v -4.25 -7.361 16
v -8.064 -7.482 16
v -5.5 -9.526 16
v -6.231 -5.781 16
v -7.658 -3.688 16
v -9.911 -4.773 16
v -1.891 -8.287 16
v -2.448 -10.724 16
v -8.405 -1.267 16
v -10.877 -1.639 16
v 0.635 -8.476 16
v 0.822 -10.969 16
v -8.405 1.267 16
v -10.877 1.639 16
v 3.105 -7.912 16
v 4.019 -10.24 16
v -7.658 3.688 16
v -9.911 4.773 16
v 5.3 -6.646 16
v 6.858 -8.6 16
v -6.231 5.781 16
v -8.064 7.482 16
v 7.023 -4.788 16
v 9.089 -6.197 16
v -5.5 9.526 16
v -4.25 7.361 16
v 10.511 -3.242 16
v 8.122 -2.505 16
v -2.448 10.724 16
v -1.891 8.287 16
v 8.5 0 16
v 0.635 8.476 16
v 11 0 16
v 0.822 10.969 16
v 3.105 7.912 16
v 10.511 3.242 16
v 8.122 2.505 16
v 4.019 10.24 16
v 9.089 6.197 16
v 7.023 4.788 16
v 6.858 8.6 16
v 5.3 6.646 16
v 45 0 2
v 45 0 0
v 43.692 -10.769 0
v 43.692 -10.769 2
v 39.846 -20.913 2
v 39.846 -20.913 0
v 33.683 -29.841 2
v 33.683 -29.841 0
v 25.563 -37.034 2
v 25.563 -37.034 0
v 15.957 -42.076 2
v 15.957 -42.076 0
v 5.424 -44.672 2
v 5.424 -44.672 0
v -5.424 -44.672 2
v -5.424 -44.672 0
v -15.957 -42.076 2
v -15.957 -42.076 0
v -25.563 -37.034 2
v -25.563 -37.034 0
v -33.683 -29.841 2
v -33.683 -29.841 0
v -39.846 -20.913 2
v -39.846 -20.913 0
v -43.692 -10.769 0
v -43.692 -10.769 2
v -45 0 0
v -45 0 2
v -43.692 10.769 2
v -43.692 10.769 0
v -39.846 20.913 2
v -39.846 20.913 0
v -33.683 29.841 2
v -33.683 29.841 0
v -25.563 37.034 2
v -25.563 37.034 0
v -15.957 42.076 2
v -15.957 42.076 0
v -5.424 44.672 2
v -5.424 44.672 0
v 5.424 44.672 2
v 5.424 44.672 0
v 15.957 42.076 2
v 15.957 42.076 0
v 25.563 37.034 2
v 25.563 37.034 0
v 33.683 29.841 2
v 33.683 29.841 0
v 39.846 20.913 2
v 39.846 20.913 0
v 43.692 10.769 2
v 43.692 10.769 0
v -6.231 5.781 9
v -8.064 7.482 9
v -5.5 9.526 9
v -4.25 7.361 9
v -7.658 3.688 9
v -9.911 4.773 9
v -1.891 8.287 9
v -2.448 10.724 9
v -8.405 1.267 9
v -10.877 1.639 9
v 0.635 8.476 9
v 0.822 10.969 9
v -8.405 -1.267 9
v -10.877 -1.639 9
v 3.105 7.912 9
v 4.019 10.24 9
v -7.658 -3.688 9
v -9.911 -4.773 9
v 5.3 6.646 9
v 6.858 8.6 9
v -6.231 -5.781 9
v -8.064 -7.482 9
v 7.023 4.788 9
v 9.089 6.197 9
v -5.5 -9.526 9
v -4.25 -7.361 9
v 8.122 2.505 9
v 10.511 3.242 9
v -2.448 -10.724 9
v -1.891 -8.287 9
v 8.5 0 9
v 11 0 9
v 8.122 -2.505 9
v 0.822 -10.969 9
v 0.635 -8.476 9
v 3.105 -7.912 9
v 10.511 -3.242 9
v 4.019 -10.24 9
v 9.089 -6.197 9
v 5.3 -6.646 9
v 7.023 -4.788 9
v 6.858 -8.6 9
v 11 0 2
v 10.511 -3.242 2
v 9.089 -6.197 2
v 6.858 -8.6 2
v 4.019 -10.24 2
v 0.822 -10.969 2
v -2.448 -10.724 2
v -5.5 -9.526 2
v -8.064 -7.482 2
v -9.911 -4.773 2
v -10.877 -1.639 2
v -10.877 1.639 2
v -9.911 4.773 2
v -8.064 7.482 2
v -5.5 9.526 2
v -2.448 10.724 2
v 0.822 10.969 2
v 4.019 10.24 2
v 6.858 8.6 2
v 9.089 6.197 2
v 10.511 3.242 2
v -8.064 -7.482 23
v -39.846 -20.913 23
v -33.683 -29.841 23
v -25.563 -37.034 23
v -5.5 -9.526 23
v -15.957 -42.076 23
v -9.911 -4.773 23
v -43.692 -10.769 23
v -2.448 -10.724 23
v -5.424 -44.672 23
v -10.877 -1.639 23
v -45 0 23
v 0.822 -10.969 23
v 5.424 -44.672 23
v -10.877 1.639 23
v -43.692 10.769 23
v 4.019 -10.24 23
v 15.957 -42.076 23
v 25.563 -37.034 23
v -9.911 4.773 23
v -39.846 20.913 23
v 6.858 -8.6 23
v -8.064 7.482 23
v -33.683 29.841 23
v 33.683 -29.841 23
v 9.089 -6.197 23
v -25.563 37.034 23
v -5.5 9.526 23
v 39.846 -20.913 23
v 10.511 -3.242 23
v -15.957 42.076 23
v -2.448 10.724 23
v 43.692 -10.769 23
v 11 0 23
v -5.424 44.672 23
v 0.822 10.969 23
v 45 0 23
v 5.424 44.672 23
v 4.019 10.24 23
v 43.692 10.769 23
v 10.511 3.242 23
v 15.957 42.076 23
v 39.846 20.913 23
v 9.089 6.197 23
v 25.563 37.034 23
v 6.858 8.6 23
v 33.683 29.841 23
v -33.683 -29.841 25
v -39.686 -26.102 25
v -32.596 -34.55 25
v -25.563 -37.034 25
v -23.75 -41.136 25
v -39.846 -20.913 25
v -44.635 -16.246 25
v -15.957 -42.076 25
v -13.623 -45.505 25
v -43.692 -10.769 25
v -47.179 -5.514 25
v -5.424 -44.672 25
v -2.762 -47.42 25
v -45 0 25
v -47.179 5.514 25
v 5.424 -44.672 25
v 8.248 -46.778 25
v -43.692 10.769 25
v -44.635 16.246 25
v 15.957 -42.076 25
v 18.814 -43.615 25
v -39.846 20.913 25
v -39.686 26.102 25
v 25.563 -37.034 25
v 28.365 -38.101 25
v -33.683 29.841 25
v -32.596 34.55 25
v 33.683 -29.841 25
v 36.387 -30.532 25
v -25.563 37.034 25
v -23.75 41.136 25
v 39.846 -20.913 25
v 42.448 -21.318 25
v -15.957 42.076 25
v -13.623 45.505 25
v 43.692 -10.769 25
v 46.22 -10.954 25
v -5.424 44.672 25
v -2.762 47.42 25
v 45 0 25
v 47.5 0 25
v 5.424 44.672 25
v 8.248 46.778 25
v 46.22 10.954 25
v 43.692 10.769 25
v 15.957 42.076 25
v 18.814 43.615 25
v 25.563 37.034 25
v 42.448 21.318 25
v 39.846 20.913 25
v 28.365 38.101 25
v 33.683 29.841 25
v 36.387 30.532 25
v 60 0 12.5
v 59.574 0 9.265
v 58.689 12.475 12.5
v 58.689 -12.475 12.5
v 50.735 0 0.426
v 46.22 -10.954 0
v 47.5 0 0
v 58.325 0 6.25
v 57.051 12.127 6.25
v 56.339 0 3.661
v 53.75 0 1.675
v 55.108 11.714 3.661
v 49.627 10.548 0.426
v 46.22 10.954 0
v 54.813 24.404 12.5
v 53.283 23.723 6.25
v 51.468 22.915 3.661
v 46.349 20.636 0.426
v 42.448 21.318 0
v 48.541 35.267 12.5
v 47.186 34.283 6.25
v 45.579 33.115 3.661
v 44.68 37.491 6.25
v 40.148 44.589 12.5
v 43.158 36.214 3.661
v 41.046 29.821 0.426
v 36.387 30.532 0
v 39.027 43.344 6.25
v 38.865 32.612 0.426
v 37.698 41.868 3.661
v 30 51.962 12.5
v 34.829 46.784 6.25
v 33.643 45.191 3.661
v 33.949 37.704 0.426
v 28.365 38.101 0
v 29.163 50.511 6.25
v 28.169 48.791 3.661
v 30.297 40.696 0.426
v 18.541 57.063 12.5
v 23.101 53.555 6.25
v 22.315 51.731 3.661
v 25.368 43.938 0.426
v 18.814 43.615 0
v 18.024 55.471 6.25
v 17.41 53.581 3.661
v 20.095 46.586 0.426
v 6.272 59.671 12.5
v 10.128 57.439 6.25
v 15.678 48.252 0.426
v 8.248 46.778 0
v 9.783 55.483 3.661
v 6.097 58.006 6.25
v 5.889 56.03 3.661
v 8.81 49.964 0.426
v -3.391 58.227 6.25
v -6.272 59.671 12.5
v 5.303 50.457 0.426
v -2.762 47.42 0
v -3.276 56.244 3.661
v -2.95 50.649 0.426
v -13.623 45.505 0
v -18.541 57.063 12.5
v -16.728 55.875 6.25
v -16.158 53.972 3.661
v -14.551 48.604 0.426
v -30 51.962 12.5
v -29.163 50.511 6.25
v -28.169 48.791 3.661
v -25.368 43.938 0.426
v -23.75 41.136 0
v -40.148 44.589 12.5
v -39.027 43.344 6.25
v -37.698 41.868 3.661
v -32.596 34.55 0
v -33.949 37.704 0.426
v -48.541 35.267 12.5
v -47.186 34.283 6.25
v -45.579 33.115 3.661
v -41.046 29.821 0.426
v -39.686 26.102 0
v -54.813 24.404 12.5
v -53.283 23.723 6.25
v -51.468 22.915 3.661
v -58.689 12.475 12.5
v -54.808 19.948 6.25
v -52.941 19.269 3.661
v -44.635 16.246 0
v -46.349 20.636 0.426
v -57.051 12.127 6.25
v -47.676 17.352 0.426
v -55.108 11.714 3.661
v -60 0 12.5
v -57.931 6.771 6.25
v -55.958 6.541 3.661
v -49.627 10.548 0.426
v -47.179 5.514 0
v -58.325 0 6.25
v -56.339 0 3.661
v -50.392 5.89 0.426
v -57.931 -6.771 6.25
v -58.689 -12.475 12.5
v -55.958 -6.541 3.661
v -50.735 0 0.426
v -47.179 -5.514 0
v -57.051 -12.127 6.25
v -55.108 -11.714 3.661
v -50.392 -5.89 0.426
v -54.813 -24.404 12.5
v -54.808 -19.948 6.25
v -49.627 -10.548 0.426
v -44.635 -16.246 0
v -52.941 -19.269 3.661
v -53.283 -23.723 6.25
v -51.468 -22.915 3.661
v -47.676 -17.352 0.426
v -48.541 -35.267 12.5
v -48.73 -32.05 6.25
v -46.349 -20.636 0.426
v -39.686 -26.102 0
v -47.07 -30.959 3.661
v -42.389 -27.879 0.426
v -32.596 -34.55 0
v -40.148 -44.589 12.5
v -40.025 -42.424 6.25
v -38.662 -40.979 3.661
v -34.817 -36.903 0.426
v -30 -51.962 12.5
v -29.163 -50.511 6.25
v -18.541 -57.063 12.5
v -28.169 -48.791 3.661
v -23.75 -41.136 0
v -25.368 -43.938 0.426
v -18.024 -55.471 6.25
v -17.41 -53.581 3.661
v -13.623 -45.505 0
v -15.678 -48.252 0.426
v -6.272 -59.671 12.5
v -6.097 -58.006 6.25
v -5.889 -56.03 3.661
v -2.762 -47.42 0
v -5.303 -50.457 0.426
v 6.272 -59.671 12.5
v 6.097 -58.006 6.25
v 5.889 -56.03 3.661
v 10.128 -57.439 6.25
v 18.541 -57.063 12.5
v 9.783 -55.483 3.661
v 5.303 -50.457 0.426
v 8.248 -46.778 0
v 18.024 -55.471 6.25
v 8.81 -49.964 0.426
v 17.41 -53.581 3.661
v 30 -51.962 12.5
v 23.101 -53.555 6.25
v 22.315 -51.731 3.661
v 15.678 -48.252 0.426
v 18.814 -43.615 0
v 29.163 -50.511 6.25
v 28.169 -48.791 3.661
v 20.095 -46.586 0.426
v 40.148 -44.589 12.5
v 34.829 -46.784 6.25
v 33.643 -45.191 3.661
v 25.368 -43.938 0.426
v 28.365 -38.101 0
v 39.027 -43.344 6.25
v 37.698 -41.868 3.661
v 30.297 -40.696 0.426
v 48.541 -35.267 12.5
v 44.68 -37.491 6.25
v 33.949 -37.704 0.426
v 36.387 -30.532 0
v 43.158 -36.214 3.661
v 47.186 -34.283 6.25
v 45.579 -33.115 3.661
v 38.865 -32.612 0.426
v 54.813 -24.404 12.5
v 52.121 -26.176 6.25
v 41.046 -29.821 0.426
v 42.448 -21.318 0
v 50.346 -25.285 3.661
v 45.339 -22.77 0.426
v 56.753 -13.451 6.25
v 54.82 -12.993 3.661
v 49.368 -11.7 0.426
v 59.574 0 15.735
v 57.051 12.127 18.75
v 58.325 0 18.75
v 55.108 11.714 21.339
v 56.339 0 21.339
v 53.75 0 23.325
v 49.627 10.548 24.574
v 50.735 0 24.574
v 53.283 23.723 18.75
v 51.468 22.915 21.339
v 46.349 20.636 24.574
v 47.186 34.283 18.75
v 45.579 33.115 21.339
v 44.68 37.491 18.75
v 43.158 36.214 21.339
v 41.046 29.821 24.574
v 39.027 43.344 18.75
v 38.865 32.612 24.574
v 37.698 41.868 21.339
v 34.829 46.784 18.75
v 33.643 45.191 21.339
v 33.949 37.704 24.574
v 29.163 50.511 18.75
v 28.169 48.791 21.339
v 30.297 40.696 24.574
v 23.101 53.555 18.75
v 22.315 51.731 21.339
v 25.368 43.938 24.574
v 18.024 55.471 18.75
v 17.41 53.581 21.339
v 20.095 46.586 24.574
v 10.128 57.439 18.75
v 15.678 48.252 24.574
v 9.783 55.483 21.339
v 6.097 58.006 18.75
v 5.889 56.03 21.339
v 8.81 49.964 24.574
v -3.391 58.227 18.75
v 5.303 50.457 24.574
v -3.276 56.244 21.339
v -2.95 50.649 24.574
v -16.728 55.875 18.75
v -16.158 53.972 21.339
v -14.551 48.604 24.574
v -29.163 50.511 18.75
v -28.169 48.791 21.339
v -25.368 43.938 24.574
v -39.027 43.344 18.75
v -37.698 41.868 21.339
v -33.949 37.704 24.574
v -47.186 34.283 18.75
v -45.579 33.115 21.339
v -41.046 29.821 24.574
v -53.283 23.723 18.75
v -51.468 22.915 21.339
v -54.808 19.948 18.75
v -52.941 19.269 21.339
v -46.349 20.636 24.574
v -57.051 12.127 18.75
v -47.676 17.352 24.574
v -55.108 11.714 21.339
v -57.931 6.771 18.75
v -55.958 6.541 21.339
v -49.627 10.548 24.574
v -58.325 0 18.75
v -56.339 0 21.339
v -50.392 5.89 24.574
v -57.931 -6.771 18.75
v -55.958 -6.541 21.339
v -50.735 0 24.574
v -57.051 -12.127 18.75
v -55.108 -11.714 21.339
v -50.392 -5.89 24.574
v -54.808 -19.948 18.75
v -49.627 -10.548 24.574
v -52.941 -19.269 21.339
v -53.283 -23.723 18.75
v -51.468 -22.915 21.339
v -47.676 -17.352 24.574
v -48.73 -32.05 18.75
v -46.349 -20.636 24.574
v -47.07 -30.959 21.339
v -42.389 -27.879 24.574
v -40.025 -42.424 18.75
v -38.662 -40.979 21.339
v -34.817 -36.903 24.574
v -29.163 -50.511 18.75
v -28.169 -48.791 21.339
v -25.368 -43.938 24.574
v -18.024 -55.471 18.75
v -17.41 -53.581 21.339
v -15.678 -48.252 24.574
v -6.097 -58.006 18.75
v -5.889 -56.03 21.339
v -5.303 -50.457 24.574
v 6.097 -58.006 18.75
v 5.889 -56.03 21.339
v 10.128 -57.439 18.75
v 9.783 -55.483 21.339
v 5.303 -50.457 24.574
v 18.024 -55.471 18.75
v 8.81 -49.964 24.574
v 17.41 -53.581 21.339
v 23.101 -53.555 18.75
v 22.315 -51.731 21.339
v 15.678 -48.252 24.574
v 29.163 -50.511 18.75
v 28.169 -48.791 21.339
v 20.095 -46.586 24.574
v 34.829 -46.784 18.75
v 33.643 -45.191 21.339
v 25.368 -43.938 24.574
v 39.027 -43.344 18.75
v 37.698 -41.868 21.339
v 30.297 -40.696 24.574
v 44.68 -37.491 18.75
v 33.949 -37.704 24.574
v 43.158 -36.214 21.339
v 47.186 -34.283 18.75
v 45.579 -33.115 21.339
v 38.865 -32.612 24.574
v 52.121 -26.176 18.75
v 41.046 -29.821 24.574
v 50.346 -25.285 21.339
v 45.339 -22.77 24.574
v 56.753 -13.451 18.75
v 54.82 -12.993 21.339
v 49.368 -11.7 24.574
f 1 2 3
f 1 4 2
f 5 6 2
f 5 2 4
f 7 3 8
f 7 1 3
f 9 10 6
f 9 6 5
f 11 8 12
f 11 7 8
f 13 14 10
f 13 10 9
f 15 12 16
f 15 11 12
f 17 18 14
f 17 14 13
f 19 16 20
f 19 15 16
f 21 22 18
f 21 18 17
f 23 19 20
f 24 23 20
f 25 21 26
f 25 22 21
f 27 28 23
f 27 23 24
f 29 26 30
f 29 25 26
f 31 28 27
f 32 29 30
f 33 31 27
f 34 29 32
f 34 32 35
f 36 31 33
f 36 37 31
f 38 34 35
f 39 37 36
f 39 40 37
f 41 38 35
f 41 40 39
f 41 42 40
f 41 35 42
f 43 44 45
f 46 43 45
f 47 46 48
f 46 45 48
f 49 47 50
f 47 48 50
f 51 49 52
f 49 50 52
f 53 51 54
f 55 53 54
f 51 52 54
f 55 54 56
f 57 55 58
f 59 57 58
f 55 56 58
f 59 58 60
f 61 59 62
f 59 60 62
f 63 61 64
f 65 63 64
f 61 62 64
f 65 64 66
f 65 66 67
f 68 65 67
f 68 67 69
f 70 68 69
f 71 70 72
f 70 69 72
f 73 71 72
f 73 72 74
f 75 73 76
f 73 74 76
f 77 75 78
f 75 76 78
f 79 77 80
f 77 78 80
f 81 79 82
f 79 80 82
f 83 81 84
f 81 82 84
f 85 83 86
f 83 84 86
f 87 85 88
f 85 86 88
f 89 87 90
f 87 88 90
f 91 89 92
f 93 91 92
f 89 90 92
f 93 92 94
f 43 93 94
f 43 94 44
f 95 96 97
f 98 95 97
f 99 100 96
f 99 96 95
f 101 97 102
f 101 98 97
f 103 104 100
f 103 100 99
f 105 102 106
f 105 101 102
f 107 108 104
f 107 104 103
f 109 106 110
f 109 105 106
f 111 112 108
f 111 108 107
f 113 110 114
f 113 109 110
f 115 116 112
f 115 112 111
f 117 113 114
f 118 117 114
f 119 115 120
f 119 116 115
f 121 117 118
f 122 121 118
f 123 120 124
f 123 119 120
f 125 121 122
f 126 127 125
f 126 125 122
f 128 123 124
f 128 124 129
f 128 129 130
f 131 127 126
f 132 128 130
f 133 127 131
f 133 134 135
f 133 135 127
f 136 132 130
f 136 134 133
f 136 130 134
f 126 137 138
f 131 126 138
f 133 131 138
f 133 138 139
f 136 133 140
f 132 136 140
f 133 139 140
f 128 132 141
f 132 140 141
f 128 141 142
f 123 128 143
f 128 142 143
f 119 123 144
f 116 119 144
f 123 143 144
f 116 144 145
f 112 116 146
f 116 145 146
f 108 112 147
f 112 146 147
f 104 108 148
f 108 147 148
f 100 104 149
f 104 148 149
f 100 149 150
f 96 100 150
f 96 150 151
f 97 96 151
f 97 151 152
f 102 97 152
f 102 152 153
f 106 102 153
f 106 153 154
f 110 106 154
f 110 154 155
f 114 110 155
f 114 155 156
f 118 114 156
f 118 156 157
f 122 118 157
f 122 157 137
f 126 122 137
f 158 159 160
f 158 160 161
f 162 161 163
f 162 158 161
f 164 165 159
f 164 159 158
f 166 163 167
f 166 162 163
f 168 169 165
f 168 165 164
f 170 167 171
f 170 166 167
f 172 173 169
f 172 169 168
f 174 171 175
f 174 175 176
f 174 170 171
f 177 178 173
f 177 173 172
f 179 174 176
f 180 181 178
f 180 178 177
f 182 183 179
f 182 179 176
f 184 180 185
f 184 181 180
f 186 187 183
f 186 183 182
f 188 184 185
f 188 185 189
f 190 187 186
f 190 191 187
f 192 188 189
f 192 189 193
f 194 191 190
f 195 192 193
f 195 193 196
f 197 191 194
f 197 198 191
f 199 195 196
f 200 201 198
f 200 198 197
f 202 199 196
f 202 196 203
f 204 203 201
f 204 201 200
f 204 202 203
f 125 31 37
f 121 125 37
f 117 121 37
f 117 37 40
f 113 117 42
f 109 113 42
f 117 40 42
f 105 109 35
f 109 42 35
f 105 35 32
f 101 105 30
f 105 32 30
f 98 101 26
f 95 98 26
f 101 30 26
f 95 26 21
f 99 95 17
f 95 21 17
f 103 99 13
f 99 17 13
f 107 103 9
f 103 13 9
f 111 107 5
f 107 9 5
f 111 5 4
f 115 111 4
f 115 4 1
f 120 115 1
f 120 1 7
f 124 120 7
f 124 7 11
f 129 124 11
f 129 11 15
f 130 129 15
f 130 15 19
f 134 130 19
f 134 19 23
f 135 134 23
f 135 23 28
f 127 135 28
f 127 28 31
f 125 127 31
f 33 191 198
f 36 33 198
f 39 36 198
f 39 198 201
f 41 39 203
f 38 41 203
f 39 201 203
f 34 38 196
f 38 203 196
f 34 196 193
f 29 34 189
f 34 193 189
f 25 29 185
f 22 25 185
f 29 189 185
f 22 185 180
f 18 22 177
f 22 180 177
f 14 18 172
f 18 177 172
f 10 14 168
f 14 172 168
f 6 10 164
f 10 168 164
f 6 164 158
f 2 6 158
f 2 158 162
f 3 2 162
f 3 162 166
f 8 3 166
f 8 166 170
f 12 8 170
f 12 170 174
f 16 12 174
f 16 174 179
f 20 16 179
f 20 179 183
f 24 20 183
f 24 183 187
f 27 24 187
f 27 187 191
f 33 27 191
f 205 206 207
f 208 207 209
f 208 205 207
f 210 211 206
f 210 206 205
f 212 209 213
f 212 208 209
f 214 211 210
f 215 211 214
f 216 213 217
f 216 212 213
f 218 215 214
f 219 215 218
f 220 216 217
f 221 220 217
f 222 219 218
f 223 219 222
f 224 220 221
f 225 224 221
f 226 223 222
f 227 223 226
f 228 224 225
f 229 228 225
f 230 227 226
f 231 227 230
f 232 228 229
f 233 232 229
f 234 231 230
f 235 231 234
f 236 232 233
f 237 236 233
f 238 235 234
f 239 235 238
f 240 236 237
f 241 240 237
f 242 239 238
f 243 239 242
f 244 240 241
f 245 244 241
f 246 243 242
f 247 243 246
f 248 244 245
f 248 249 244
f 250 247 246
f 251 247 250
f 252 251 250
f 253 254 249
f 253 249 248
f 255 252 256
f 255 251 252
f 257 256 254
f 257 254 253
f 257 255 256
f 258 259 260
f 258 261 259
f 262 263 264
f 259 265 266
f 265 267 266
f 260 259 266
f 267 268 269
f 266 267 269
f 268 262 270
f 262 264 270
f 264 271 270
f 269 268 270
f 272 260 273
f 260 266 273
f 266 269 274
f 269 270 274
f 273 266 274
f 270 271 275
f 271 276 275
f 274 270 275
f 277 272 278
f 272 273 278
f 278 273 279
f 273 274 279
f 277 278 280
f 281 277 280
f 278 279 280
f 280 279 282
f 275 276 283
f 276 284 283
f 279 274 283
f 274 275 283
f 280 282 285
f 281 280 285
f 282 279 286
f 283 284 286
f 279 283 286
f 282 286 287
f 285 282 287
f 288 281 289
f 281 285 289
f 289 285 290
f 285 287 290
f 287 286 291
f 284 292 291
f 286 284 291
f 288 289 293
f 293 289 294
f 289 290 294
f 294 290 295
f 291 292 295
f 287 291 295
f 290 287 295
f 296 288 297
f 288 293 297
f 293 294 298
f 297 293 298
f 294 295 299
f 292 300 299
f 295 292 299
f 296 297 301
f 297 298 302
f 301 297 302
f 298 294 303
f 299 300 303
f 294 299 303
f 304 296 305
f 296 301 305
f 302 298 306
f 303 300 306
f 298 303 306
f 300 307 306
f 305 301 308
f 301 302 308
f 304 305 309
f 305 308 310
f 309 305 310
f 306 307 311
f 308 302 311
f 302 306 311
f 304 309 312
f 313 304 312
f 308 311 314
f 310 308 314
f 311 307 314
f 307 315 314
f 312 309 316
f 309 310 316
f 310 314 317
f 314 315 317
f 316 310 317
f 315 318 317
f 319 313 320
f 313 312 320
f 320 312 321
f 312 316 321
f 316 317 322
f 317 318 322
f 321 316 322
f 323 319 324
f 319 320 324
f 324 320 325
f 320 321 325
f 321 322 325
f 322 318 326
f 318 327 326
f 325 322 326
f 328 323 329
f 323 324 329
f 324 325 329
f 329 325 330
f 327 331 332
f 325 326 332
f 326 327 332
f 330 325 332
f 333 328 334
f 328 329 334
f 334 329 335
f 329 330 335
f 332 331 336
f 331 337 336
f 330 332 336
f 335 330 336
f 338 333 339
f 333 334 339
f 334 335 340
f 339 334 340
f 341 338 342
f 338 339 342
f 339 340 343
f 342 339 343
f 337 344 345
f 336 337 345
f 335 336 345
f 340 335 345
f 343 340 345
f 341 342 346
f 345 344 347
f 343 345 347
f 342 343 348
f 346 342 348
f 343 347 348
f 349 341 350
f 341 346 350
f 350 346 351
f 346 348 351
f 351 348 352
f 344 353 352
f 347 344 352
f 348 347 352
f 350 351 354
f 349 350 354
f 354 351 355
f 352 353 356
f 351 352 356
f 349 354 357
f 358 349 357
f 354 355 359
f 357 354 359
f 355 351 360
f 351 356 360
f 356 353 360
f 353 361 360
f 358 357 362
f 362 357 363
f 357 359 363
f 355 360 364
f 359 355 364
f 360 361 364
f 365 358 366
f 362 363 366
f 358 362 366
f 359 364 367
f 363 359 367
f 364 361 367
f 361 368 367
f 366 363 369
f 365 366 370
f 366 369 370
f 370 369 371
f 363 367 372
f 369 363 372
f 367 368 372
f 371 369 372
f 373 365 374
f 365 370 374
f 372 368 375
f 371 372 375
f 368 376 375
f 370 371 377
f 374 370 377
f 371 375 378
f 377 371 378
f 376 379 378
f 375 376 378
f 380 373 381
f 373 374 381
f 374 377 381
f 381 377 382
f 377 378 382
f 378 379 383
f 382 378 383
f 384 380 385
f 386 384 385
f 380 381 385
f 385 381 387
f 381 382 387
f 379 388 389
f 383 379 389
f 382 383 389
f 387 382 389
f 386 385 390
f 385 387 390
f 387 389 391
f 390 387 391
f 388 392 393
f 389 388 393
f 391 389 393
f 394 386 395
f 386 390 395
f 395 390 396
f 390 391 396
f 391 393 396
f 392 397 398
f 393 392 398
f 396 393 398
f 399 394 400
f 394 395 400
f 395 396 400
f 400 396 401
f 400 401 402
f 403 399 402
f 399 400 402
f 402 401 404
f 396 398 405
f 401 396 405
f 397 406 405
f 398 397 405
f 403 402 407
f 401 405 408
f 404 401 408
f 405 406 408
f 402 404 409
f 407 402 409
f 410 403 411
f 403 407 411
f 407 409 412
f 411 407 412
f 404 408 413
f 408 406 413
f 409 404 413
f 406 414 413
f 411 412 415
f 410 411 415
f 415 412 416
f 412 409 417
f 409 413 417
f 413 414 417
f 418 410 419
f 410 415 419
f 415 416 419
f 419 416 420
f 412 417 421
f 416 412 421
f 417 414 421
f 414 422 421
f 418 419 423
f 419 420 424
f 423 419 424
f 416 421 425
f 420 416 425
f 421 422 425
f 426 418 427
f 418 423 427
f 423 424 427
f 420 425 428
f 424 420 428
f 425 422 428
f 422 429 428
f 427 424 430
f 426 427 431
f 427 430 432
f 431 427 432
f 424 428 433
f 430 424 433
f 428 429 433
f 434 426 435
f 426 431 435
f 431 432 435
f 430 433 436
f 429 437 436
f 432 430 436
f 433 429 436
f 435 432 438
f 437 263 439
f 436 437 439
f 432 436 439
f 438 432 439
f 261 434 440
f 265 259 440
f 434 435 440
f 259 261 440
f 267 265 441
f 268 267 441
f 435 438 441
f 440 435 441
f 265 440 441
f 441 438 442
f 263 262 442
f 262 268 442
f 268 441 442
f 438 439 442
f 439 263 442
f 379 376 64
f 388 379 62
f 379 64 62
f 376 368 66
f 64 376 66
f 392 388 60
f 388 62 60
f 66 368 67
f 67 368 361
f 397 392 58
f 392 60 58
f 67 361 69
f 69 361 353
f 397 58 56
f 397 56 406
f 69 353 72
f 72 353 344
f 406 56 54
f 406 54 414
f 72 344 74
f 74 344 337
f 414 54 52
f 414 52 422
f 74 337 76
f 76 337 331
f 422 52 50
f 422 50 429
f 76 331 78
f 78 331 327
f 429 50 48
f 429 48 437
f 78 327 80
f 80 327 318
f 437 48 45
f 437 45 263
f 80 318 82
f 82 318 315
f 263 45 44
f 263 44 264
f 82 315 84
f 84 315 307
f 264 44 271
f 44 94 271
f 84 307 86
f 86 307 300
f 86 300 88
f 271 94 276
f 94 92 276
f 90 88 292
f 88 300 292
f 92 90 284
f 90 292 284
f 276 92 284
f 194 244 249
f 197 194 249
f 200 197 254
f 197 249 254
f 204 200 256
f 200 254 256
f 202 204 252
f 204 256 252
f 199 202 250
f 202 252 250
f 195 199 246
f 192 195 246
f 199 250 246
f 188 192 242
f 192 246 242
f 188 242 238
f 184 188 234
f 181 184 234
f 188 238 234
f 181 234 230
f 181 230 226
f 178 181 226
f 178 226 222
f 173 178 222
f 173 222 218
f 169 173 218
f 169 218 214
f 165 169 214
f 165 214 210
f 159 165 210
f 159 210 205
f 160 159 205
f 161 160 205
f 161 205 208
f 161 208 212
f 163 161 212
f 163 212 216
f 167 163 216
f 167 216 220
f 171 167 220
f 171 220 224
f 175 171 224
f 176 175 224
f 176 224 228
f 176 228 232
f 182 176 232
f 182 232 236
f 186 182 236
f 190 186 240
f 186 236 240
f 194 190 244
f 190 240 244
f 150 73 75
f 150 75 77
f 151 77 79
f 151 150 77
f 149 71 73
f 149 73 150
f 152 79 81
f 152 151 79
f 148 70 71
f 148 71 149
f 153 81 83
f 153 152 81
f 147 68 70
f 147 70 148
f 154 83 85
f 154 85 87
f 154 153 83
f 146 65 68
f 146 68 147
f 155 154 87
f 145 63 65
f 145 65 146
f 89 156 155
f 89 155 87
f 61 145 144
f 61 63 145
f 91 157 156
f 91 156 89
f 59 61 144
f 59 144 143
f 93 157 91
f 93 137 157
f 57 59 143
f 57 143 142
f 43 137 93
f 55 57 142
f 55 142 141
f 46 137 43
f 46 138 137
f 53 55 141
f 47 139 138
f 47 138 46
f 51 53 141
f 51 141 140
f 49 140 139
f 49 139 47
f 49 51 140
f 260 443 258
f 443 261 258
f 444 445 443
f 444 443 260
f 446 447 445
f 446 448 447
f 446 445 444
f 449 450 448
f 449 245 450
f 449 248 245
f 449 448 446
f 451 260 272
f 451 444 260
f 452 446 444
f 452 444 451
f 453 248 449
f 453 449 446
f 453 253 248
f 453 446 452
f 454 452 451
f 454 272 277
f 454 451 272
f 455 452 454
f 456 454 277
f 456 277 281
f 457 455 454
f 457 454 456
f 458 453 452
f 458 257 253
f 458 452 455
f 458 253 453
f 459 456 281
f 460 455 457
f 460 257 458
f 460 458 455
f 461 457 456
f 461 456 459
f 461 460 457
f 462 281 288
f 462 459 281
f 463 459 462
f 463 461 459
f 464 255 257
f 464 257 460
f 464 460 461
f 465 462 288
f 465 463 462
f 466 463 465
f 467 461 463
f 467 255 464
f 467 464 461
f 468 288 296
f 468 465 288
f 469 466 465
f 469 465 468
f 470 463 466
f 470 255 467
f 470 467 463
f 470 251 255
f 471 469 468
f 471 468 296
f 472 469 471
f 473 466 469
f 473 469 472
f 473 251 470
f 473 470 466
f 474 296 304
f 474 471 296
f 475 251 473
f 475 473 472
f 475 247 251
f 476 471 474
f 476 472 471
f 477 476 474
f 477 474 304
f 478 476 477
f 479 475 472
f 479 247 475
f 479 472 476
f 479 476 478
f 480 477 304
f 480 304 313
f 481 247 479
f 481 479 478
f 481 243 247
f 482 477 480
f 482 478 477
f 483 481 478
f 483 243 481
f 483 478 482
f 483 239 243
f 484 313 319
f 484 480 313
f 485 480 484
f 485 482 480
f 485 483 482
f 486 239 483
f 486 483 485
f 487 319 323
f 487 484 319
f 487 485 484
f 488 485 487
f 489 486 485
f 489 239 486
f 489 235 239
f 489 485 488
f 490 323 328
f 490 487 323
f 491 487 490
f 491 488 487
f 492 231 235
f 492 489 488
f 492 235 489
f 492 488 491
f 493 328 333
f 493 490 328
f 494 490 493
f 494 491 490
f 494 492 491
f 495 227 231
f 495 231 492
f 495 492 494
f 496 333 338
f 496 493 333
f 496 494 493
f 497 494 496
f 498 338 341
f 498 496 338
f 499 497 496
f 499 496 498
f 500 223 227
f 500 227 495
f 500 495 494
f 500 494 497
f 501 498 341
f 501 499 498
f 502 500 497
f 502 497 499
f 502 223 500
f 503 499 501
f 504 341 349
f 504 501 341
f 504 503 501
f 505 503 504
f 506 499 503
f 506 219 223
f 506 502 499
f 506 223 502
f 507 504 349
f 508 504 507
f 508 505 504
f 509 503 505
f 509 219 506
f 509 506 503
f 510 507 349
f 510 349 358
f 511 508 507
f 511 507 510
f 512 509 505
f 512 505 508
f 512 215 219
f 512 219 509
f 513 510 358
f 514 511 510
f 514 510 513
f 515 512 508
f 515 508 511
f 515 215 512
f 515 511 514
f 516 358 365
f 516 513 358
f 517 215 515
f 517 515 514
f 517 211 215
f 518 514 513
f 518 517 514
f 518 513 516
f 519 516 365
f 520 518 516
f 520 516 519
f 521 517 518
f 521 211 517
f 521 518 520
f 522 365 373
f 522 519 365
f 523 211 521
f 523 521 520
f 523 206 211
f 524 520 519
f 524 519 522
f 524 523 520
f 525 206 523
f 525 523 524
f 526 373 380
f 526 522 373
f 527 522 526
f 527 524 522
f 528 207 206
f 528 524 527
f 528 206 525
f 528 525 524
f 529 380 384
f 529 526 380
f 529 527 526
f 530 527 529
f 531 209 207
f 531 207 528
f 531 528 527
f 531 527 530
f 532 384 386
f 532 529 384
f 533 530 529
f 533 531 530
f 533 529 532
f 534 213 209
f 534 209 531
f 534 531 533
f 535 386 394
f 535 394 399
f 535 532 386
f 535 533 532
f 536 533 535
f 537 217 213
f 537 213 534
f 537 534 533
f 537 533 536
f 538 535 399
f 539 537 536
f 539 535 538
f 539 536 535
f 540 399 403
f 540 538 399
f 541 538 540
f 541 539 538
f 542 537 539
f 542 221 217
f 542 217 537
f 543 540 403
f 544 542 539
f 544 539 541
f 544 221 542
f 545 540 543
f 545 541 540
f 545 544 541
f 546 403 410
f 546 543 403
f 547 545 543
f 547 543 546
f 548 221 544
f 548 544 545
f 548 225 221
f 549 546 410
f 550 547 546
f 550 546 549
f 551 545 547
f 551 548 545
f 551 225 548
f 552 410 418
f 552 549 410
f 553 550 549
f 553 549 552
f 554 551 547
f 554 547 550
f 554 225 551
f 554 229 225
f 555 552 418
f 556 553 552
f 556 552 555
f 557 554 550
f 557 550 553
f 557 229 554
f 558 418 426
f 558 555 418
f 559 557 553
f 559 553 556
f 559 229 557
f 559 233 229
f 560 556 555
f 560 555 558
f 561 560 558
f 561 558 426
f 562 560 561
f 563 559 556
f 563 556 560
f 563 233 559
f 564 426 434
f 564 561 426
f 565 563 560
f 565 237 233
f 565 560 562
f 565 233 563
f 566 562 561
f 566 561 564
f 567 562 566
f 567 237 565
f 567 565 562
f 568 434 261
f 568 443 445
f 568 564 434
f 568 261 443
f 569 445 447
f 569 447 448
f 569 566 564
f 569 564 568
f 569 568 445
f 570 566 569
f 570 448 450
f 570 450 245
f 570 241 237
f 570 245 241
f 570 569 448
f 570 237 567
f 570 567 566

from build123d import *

# Parameters (mm, degrees)
F0_R      = 60
F1_DEPTH  = 25
F2_R      = 11
F4_DEPTH  = 9
F3_R      = 45
F3_R_2    = 11
F5_DEPTH  = 0.01
F6_DEPTH  = 2
F7_R      = 11
F9_DEPTH  = 9
F8_R      = 45
F10_DEPTH = 2
F11_R     = 12.5
F12_R     = 12.49999
F13_R     = 8.5
F14_DEPTH = 25


# Not quite as in the source:
# - a fillet or chamfer is up to 0.001 mm smaller than in the source, because OpenCascade refuses the exact size


with BuildPart() as f1:
    # F0 (on Top) → F1 (new body)
    with BuildSketch(Plane.XY):
        Circle(F0_R)
    extrude(amount=F1_DEPTH)

    # F2 (on face) → F4 (cut)
    with BuildSketch(Plane.XY.offset(25)):
        Circle(F2_R)
    extrude(amount=-F4_DEPTH, mode=Mode.SUBTRACT)

    # F3 (on face) → F5 (cut)
    with BuildSketch(Plane.XY.offset(25)):
        Circle(F3_R)
        Circle(F3_R_2, mode=Mode.SUBTRACT)
    extrude(amount=-F5_DEPTH, mode=Mode.SUBTRACT)

    # F3 (on face) → F6 (cut)
    with BuildSketch(Plane.XY.offset(25)):
        Circle(F3_R)
    extrude(amount=-F6_DEPTH, mode=Mode.SUBTRACT)

    # F7 (on face) → F9 (cut)
    with BuildSketch(Plane(origin=(0, 0, 0), x_dir=(1, 0, 0), z_dir=(0, 0, -1))):
        Circle(F7_R)
    extrude(amount=-F9_DEPTH, mode=Mode.SUBTRACT)

    # F8 (on face) → F10 (cut)
    with BuildSketch(Plane(origin=(0, 0, 0), x_dir=(1, 0, 0), z_dir=(0, 0, -1))):
        Circle(F8_R)
    extrude(amount=-F10_DEPTH, mode=Mode.SUBTRACT)

    # F11
    f11_edges = [f1.edges().sort_by_distance(p)[0] for p in [
        (-60, 0, 25),
    ]]
    fillet(f11_edges, radius=F11_R)

    # F12 (radius 12.5 in the source; OpenCascade refuses exactly that, so slightly less here)
    f12_edges = [f1.edges().sort_by_distance(p)[0] for p in [
        (-60, 0, 0),
    ]]
    fillet(f12_edges, radius=F12_R)

    # F13 (on face) → F14 (cut)
    with BuildSketch(Plane.XY.offset(16)):
        Circle(F13_R)
    extrude(amount=-F14_DEPTH, mode=Mode.SUBTRACT)


solid = f1.part
